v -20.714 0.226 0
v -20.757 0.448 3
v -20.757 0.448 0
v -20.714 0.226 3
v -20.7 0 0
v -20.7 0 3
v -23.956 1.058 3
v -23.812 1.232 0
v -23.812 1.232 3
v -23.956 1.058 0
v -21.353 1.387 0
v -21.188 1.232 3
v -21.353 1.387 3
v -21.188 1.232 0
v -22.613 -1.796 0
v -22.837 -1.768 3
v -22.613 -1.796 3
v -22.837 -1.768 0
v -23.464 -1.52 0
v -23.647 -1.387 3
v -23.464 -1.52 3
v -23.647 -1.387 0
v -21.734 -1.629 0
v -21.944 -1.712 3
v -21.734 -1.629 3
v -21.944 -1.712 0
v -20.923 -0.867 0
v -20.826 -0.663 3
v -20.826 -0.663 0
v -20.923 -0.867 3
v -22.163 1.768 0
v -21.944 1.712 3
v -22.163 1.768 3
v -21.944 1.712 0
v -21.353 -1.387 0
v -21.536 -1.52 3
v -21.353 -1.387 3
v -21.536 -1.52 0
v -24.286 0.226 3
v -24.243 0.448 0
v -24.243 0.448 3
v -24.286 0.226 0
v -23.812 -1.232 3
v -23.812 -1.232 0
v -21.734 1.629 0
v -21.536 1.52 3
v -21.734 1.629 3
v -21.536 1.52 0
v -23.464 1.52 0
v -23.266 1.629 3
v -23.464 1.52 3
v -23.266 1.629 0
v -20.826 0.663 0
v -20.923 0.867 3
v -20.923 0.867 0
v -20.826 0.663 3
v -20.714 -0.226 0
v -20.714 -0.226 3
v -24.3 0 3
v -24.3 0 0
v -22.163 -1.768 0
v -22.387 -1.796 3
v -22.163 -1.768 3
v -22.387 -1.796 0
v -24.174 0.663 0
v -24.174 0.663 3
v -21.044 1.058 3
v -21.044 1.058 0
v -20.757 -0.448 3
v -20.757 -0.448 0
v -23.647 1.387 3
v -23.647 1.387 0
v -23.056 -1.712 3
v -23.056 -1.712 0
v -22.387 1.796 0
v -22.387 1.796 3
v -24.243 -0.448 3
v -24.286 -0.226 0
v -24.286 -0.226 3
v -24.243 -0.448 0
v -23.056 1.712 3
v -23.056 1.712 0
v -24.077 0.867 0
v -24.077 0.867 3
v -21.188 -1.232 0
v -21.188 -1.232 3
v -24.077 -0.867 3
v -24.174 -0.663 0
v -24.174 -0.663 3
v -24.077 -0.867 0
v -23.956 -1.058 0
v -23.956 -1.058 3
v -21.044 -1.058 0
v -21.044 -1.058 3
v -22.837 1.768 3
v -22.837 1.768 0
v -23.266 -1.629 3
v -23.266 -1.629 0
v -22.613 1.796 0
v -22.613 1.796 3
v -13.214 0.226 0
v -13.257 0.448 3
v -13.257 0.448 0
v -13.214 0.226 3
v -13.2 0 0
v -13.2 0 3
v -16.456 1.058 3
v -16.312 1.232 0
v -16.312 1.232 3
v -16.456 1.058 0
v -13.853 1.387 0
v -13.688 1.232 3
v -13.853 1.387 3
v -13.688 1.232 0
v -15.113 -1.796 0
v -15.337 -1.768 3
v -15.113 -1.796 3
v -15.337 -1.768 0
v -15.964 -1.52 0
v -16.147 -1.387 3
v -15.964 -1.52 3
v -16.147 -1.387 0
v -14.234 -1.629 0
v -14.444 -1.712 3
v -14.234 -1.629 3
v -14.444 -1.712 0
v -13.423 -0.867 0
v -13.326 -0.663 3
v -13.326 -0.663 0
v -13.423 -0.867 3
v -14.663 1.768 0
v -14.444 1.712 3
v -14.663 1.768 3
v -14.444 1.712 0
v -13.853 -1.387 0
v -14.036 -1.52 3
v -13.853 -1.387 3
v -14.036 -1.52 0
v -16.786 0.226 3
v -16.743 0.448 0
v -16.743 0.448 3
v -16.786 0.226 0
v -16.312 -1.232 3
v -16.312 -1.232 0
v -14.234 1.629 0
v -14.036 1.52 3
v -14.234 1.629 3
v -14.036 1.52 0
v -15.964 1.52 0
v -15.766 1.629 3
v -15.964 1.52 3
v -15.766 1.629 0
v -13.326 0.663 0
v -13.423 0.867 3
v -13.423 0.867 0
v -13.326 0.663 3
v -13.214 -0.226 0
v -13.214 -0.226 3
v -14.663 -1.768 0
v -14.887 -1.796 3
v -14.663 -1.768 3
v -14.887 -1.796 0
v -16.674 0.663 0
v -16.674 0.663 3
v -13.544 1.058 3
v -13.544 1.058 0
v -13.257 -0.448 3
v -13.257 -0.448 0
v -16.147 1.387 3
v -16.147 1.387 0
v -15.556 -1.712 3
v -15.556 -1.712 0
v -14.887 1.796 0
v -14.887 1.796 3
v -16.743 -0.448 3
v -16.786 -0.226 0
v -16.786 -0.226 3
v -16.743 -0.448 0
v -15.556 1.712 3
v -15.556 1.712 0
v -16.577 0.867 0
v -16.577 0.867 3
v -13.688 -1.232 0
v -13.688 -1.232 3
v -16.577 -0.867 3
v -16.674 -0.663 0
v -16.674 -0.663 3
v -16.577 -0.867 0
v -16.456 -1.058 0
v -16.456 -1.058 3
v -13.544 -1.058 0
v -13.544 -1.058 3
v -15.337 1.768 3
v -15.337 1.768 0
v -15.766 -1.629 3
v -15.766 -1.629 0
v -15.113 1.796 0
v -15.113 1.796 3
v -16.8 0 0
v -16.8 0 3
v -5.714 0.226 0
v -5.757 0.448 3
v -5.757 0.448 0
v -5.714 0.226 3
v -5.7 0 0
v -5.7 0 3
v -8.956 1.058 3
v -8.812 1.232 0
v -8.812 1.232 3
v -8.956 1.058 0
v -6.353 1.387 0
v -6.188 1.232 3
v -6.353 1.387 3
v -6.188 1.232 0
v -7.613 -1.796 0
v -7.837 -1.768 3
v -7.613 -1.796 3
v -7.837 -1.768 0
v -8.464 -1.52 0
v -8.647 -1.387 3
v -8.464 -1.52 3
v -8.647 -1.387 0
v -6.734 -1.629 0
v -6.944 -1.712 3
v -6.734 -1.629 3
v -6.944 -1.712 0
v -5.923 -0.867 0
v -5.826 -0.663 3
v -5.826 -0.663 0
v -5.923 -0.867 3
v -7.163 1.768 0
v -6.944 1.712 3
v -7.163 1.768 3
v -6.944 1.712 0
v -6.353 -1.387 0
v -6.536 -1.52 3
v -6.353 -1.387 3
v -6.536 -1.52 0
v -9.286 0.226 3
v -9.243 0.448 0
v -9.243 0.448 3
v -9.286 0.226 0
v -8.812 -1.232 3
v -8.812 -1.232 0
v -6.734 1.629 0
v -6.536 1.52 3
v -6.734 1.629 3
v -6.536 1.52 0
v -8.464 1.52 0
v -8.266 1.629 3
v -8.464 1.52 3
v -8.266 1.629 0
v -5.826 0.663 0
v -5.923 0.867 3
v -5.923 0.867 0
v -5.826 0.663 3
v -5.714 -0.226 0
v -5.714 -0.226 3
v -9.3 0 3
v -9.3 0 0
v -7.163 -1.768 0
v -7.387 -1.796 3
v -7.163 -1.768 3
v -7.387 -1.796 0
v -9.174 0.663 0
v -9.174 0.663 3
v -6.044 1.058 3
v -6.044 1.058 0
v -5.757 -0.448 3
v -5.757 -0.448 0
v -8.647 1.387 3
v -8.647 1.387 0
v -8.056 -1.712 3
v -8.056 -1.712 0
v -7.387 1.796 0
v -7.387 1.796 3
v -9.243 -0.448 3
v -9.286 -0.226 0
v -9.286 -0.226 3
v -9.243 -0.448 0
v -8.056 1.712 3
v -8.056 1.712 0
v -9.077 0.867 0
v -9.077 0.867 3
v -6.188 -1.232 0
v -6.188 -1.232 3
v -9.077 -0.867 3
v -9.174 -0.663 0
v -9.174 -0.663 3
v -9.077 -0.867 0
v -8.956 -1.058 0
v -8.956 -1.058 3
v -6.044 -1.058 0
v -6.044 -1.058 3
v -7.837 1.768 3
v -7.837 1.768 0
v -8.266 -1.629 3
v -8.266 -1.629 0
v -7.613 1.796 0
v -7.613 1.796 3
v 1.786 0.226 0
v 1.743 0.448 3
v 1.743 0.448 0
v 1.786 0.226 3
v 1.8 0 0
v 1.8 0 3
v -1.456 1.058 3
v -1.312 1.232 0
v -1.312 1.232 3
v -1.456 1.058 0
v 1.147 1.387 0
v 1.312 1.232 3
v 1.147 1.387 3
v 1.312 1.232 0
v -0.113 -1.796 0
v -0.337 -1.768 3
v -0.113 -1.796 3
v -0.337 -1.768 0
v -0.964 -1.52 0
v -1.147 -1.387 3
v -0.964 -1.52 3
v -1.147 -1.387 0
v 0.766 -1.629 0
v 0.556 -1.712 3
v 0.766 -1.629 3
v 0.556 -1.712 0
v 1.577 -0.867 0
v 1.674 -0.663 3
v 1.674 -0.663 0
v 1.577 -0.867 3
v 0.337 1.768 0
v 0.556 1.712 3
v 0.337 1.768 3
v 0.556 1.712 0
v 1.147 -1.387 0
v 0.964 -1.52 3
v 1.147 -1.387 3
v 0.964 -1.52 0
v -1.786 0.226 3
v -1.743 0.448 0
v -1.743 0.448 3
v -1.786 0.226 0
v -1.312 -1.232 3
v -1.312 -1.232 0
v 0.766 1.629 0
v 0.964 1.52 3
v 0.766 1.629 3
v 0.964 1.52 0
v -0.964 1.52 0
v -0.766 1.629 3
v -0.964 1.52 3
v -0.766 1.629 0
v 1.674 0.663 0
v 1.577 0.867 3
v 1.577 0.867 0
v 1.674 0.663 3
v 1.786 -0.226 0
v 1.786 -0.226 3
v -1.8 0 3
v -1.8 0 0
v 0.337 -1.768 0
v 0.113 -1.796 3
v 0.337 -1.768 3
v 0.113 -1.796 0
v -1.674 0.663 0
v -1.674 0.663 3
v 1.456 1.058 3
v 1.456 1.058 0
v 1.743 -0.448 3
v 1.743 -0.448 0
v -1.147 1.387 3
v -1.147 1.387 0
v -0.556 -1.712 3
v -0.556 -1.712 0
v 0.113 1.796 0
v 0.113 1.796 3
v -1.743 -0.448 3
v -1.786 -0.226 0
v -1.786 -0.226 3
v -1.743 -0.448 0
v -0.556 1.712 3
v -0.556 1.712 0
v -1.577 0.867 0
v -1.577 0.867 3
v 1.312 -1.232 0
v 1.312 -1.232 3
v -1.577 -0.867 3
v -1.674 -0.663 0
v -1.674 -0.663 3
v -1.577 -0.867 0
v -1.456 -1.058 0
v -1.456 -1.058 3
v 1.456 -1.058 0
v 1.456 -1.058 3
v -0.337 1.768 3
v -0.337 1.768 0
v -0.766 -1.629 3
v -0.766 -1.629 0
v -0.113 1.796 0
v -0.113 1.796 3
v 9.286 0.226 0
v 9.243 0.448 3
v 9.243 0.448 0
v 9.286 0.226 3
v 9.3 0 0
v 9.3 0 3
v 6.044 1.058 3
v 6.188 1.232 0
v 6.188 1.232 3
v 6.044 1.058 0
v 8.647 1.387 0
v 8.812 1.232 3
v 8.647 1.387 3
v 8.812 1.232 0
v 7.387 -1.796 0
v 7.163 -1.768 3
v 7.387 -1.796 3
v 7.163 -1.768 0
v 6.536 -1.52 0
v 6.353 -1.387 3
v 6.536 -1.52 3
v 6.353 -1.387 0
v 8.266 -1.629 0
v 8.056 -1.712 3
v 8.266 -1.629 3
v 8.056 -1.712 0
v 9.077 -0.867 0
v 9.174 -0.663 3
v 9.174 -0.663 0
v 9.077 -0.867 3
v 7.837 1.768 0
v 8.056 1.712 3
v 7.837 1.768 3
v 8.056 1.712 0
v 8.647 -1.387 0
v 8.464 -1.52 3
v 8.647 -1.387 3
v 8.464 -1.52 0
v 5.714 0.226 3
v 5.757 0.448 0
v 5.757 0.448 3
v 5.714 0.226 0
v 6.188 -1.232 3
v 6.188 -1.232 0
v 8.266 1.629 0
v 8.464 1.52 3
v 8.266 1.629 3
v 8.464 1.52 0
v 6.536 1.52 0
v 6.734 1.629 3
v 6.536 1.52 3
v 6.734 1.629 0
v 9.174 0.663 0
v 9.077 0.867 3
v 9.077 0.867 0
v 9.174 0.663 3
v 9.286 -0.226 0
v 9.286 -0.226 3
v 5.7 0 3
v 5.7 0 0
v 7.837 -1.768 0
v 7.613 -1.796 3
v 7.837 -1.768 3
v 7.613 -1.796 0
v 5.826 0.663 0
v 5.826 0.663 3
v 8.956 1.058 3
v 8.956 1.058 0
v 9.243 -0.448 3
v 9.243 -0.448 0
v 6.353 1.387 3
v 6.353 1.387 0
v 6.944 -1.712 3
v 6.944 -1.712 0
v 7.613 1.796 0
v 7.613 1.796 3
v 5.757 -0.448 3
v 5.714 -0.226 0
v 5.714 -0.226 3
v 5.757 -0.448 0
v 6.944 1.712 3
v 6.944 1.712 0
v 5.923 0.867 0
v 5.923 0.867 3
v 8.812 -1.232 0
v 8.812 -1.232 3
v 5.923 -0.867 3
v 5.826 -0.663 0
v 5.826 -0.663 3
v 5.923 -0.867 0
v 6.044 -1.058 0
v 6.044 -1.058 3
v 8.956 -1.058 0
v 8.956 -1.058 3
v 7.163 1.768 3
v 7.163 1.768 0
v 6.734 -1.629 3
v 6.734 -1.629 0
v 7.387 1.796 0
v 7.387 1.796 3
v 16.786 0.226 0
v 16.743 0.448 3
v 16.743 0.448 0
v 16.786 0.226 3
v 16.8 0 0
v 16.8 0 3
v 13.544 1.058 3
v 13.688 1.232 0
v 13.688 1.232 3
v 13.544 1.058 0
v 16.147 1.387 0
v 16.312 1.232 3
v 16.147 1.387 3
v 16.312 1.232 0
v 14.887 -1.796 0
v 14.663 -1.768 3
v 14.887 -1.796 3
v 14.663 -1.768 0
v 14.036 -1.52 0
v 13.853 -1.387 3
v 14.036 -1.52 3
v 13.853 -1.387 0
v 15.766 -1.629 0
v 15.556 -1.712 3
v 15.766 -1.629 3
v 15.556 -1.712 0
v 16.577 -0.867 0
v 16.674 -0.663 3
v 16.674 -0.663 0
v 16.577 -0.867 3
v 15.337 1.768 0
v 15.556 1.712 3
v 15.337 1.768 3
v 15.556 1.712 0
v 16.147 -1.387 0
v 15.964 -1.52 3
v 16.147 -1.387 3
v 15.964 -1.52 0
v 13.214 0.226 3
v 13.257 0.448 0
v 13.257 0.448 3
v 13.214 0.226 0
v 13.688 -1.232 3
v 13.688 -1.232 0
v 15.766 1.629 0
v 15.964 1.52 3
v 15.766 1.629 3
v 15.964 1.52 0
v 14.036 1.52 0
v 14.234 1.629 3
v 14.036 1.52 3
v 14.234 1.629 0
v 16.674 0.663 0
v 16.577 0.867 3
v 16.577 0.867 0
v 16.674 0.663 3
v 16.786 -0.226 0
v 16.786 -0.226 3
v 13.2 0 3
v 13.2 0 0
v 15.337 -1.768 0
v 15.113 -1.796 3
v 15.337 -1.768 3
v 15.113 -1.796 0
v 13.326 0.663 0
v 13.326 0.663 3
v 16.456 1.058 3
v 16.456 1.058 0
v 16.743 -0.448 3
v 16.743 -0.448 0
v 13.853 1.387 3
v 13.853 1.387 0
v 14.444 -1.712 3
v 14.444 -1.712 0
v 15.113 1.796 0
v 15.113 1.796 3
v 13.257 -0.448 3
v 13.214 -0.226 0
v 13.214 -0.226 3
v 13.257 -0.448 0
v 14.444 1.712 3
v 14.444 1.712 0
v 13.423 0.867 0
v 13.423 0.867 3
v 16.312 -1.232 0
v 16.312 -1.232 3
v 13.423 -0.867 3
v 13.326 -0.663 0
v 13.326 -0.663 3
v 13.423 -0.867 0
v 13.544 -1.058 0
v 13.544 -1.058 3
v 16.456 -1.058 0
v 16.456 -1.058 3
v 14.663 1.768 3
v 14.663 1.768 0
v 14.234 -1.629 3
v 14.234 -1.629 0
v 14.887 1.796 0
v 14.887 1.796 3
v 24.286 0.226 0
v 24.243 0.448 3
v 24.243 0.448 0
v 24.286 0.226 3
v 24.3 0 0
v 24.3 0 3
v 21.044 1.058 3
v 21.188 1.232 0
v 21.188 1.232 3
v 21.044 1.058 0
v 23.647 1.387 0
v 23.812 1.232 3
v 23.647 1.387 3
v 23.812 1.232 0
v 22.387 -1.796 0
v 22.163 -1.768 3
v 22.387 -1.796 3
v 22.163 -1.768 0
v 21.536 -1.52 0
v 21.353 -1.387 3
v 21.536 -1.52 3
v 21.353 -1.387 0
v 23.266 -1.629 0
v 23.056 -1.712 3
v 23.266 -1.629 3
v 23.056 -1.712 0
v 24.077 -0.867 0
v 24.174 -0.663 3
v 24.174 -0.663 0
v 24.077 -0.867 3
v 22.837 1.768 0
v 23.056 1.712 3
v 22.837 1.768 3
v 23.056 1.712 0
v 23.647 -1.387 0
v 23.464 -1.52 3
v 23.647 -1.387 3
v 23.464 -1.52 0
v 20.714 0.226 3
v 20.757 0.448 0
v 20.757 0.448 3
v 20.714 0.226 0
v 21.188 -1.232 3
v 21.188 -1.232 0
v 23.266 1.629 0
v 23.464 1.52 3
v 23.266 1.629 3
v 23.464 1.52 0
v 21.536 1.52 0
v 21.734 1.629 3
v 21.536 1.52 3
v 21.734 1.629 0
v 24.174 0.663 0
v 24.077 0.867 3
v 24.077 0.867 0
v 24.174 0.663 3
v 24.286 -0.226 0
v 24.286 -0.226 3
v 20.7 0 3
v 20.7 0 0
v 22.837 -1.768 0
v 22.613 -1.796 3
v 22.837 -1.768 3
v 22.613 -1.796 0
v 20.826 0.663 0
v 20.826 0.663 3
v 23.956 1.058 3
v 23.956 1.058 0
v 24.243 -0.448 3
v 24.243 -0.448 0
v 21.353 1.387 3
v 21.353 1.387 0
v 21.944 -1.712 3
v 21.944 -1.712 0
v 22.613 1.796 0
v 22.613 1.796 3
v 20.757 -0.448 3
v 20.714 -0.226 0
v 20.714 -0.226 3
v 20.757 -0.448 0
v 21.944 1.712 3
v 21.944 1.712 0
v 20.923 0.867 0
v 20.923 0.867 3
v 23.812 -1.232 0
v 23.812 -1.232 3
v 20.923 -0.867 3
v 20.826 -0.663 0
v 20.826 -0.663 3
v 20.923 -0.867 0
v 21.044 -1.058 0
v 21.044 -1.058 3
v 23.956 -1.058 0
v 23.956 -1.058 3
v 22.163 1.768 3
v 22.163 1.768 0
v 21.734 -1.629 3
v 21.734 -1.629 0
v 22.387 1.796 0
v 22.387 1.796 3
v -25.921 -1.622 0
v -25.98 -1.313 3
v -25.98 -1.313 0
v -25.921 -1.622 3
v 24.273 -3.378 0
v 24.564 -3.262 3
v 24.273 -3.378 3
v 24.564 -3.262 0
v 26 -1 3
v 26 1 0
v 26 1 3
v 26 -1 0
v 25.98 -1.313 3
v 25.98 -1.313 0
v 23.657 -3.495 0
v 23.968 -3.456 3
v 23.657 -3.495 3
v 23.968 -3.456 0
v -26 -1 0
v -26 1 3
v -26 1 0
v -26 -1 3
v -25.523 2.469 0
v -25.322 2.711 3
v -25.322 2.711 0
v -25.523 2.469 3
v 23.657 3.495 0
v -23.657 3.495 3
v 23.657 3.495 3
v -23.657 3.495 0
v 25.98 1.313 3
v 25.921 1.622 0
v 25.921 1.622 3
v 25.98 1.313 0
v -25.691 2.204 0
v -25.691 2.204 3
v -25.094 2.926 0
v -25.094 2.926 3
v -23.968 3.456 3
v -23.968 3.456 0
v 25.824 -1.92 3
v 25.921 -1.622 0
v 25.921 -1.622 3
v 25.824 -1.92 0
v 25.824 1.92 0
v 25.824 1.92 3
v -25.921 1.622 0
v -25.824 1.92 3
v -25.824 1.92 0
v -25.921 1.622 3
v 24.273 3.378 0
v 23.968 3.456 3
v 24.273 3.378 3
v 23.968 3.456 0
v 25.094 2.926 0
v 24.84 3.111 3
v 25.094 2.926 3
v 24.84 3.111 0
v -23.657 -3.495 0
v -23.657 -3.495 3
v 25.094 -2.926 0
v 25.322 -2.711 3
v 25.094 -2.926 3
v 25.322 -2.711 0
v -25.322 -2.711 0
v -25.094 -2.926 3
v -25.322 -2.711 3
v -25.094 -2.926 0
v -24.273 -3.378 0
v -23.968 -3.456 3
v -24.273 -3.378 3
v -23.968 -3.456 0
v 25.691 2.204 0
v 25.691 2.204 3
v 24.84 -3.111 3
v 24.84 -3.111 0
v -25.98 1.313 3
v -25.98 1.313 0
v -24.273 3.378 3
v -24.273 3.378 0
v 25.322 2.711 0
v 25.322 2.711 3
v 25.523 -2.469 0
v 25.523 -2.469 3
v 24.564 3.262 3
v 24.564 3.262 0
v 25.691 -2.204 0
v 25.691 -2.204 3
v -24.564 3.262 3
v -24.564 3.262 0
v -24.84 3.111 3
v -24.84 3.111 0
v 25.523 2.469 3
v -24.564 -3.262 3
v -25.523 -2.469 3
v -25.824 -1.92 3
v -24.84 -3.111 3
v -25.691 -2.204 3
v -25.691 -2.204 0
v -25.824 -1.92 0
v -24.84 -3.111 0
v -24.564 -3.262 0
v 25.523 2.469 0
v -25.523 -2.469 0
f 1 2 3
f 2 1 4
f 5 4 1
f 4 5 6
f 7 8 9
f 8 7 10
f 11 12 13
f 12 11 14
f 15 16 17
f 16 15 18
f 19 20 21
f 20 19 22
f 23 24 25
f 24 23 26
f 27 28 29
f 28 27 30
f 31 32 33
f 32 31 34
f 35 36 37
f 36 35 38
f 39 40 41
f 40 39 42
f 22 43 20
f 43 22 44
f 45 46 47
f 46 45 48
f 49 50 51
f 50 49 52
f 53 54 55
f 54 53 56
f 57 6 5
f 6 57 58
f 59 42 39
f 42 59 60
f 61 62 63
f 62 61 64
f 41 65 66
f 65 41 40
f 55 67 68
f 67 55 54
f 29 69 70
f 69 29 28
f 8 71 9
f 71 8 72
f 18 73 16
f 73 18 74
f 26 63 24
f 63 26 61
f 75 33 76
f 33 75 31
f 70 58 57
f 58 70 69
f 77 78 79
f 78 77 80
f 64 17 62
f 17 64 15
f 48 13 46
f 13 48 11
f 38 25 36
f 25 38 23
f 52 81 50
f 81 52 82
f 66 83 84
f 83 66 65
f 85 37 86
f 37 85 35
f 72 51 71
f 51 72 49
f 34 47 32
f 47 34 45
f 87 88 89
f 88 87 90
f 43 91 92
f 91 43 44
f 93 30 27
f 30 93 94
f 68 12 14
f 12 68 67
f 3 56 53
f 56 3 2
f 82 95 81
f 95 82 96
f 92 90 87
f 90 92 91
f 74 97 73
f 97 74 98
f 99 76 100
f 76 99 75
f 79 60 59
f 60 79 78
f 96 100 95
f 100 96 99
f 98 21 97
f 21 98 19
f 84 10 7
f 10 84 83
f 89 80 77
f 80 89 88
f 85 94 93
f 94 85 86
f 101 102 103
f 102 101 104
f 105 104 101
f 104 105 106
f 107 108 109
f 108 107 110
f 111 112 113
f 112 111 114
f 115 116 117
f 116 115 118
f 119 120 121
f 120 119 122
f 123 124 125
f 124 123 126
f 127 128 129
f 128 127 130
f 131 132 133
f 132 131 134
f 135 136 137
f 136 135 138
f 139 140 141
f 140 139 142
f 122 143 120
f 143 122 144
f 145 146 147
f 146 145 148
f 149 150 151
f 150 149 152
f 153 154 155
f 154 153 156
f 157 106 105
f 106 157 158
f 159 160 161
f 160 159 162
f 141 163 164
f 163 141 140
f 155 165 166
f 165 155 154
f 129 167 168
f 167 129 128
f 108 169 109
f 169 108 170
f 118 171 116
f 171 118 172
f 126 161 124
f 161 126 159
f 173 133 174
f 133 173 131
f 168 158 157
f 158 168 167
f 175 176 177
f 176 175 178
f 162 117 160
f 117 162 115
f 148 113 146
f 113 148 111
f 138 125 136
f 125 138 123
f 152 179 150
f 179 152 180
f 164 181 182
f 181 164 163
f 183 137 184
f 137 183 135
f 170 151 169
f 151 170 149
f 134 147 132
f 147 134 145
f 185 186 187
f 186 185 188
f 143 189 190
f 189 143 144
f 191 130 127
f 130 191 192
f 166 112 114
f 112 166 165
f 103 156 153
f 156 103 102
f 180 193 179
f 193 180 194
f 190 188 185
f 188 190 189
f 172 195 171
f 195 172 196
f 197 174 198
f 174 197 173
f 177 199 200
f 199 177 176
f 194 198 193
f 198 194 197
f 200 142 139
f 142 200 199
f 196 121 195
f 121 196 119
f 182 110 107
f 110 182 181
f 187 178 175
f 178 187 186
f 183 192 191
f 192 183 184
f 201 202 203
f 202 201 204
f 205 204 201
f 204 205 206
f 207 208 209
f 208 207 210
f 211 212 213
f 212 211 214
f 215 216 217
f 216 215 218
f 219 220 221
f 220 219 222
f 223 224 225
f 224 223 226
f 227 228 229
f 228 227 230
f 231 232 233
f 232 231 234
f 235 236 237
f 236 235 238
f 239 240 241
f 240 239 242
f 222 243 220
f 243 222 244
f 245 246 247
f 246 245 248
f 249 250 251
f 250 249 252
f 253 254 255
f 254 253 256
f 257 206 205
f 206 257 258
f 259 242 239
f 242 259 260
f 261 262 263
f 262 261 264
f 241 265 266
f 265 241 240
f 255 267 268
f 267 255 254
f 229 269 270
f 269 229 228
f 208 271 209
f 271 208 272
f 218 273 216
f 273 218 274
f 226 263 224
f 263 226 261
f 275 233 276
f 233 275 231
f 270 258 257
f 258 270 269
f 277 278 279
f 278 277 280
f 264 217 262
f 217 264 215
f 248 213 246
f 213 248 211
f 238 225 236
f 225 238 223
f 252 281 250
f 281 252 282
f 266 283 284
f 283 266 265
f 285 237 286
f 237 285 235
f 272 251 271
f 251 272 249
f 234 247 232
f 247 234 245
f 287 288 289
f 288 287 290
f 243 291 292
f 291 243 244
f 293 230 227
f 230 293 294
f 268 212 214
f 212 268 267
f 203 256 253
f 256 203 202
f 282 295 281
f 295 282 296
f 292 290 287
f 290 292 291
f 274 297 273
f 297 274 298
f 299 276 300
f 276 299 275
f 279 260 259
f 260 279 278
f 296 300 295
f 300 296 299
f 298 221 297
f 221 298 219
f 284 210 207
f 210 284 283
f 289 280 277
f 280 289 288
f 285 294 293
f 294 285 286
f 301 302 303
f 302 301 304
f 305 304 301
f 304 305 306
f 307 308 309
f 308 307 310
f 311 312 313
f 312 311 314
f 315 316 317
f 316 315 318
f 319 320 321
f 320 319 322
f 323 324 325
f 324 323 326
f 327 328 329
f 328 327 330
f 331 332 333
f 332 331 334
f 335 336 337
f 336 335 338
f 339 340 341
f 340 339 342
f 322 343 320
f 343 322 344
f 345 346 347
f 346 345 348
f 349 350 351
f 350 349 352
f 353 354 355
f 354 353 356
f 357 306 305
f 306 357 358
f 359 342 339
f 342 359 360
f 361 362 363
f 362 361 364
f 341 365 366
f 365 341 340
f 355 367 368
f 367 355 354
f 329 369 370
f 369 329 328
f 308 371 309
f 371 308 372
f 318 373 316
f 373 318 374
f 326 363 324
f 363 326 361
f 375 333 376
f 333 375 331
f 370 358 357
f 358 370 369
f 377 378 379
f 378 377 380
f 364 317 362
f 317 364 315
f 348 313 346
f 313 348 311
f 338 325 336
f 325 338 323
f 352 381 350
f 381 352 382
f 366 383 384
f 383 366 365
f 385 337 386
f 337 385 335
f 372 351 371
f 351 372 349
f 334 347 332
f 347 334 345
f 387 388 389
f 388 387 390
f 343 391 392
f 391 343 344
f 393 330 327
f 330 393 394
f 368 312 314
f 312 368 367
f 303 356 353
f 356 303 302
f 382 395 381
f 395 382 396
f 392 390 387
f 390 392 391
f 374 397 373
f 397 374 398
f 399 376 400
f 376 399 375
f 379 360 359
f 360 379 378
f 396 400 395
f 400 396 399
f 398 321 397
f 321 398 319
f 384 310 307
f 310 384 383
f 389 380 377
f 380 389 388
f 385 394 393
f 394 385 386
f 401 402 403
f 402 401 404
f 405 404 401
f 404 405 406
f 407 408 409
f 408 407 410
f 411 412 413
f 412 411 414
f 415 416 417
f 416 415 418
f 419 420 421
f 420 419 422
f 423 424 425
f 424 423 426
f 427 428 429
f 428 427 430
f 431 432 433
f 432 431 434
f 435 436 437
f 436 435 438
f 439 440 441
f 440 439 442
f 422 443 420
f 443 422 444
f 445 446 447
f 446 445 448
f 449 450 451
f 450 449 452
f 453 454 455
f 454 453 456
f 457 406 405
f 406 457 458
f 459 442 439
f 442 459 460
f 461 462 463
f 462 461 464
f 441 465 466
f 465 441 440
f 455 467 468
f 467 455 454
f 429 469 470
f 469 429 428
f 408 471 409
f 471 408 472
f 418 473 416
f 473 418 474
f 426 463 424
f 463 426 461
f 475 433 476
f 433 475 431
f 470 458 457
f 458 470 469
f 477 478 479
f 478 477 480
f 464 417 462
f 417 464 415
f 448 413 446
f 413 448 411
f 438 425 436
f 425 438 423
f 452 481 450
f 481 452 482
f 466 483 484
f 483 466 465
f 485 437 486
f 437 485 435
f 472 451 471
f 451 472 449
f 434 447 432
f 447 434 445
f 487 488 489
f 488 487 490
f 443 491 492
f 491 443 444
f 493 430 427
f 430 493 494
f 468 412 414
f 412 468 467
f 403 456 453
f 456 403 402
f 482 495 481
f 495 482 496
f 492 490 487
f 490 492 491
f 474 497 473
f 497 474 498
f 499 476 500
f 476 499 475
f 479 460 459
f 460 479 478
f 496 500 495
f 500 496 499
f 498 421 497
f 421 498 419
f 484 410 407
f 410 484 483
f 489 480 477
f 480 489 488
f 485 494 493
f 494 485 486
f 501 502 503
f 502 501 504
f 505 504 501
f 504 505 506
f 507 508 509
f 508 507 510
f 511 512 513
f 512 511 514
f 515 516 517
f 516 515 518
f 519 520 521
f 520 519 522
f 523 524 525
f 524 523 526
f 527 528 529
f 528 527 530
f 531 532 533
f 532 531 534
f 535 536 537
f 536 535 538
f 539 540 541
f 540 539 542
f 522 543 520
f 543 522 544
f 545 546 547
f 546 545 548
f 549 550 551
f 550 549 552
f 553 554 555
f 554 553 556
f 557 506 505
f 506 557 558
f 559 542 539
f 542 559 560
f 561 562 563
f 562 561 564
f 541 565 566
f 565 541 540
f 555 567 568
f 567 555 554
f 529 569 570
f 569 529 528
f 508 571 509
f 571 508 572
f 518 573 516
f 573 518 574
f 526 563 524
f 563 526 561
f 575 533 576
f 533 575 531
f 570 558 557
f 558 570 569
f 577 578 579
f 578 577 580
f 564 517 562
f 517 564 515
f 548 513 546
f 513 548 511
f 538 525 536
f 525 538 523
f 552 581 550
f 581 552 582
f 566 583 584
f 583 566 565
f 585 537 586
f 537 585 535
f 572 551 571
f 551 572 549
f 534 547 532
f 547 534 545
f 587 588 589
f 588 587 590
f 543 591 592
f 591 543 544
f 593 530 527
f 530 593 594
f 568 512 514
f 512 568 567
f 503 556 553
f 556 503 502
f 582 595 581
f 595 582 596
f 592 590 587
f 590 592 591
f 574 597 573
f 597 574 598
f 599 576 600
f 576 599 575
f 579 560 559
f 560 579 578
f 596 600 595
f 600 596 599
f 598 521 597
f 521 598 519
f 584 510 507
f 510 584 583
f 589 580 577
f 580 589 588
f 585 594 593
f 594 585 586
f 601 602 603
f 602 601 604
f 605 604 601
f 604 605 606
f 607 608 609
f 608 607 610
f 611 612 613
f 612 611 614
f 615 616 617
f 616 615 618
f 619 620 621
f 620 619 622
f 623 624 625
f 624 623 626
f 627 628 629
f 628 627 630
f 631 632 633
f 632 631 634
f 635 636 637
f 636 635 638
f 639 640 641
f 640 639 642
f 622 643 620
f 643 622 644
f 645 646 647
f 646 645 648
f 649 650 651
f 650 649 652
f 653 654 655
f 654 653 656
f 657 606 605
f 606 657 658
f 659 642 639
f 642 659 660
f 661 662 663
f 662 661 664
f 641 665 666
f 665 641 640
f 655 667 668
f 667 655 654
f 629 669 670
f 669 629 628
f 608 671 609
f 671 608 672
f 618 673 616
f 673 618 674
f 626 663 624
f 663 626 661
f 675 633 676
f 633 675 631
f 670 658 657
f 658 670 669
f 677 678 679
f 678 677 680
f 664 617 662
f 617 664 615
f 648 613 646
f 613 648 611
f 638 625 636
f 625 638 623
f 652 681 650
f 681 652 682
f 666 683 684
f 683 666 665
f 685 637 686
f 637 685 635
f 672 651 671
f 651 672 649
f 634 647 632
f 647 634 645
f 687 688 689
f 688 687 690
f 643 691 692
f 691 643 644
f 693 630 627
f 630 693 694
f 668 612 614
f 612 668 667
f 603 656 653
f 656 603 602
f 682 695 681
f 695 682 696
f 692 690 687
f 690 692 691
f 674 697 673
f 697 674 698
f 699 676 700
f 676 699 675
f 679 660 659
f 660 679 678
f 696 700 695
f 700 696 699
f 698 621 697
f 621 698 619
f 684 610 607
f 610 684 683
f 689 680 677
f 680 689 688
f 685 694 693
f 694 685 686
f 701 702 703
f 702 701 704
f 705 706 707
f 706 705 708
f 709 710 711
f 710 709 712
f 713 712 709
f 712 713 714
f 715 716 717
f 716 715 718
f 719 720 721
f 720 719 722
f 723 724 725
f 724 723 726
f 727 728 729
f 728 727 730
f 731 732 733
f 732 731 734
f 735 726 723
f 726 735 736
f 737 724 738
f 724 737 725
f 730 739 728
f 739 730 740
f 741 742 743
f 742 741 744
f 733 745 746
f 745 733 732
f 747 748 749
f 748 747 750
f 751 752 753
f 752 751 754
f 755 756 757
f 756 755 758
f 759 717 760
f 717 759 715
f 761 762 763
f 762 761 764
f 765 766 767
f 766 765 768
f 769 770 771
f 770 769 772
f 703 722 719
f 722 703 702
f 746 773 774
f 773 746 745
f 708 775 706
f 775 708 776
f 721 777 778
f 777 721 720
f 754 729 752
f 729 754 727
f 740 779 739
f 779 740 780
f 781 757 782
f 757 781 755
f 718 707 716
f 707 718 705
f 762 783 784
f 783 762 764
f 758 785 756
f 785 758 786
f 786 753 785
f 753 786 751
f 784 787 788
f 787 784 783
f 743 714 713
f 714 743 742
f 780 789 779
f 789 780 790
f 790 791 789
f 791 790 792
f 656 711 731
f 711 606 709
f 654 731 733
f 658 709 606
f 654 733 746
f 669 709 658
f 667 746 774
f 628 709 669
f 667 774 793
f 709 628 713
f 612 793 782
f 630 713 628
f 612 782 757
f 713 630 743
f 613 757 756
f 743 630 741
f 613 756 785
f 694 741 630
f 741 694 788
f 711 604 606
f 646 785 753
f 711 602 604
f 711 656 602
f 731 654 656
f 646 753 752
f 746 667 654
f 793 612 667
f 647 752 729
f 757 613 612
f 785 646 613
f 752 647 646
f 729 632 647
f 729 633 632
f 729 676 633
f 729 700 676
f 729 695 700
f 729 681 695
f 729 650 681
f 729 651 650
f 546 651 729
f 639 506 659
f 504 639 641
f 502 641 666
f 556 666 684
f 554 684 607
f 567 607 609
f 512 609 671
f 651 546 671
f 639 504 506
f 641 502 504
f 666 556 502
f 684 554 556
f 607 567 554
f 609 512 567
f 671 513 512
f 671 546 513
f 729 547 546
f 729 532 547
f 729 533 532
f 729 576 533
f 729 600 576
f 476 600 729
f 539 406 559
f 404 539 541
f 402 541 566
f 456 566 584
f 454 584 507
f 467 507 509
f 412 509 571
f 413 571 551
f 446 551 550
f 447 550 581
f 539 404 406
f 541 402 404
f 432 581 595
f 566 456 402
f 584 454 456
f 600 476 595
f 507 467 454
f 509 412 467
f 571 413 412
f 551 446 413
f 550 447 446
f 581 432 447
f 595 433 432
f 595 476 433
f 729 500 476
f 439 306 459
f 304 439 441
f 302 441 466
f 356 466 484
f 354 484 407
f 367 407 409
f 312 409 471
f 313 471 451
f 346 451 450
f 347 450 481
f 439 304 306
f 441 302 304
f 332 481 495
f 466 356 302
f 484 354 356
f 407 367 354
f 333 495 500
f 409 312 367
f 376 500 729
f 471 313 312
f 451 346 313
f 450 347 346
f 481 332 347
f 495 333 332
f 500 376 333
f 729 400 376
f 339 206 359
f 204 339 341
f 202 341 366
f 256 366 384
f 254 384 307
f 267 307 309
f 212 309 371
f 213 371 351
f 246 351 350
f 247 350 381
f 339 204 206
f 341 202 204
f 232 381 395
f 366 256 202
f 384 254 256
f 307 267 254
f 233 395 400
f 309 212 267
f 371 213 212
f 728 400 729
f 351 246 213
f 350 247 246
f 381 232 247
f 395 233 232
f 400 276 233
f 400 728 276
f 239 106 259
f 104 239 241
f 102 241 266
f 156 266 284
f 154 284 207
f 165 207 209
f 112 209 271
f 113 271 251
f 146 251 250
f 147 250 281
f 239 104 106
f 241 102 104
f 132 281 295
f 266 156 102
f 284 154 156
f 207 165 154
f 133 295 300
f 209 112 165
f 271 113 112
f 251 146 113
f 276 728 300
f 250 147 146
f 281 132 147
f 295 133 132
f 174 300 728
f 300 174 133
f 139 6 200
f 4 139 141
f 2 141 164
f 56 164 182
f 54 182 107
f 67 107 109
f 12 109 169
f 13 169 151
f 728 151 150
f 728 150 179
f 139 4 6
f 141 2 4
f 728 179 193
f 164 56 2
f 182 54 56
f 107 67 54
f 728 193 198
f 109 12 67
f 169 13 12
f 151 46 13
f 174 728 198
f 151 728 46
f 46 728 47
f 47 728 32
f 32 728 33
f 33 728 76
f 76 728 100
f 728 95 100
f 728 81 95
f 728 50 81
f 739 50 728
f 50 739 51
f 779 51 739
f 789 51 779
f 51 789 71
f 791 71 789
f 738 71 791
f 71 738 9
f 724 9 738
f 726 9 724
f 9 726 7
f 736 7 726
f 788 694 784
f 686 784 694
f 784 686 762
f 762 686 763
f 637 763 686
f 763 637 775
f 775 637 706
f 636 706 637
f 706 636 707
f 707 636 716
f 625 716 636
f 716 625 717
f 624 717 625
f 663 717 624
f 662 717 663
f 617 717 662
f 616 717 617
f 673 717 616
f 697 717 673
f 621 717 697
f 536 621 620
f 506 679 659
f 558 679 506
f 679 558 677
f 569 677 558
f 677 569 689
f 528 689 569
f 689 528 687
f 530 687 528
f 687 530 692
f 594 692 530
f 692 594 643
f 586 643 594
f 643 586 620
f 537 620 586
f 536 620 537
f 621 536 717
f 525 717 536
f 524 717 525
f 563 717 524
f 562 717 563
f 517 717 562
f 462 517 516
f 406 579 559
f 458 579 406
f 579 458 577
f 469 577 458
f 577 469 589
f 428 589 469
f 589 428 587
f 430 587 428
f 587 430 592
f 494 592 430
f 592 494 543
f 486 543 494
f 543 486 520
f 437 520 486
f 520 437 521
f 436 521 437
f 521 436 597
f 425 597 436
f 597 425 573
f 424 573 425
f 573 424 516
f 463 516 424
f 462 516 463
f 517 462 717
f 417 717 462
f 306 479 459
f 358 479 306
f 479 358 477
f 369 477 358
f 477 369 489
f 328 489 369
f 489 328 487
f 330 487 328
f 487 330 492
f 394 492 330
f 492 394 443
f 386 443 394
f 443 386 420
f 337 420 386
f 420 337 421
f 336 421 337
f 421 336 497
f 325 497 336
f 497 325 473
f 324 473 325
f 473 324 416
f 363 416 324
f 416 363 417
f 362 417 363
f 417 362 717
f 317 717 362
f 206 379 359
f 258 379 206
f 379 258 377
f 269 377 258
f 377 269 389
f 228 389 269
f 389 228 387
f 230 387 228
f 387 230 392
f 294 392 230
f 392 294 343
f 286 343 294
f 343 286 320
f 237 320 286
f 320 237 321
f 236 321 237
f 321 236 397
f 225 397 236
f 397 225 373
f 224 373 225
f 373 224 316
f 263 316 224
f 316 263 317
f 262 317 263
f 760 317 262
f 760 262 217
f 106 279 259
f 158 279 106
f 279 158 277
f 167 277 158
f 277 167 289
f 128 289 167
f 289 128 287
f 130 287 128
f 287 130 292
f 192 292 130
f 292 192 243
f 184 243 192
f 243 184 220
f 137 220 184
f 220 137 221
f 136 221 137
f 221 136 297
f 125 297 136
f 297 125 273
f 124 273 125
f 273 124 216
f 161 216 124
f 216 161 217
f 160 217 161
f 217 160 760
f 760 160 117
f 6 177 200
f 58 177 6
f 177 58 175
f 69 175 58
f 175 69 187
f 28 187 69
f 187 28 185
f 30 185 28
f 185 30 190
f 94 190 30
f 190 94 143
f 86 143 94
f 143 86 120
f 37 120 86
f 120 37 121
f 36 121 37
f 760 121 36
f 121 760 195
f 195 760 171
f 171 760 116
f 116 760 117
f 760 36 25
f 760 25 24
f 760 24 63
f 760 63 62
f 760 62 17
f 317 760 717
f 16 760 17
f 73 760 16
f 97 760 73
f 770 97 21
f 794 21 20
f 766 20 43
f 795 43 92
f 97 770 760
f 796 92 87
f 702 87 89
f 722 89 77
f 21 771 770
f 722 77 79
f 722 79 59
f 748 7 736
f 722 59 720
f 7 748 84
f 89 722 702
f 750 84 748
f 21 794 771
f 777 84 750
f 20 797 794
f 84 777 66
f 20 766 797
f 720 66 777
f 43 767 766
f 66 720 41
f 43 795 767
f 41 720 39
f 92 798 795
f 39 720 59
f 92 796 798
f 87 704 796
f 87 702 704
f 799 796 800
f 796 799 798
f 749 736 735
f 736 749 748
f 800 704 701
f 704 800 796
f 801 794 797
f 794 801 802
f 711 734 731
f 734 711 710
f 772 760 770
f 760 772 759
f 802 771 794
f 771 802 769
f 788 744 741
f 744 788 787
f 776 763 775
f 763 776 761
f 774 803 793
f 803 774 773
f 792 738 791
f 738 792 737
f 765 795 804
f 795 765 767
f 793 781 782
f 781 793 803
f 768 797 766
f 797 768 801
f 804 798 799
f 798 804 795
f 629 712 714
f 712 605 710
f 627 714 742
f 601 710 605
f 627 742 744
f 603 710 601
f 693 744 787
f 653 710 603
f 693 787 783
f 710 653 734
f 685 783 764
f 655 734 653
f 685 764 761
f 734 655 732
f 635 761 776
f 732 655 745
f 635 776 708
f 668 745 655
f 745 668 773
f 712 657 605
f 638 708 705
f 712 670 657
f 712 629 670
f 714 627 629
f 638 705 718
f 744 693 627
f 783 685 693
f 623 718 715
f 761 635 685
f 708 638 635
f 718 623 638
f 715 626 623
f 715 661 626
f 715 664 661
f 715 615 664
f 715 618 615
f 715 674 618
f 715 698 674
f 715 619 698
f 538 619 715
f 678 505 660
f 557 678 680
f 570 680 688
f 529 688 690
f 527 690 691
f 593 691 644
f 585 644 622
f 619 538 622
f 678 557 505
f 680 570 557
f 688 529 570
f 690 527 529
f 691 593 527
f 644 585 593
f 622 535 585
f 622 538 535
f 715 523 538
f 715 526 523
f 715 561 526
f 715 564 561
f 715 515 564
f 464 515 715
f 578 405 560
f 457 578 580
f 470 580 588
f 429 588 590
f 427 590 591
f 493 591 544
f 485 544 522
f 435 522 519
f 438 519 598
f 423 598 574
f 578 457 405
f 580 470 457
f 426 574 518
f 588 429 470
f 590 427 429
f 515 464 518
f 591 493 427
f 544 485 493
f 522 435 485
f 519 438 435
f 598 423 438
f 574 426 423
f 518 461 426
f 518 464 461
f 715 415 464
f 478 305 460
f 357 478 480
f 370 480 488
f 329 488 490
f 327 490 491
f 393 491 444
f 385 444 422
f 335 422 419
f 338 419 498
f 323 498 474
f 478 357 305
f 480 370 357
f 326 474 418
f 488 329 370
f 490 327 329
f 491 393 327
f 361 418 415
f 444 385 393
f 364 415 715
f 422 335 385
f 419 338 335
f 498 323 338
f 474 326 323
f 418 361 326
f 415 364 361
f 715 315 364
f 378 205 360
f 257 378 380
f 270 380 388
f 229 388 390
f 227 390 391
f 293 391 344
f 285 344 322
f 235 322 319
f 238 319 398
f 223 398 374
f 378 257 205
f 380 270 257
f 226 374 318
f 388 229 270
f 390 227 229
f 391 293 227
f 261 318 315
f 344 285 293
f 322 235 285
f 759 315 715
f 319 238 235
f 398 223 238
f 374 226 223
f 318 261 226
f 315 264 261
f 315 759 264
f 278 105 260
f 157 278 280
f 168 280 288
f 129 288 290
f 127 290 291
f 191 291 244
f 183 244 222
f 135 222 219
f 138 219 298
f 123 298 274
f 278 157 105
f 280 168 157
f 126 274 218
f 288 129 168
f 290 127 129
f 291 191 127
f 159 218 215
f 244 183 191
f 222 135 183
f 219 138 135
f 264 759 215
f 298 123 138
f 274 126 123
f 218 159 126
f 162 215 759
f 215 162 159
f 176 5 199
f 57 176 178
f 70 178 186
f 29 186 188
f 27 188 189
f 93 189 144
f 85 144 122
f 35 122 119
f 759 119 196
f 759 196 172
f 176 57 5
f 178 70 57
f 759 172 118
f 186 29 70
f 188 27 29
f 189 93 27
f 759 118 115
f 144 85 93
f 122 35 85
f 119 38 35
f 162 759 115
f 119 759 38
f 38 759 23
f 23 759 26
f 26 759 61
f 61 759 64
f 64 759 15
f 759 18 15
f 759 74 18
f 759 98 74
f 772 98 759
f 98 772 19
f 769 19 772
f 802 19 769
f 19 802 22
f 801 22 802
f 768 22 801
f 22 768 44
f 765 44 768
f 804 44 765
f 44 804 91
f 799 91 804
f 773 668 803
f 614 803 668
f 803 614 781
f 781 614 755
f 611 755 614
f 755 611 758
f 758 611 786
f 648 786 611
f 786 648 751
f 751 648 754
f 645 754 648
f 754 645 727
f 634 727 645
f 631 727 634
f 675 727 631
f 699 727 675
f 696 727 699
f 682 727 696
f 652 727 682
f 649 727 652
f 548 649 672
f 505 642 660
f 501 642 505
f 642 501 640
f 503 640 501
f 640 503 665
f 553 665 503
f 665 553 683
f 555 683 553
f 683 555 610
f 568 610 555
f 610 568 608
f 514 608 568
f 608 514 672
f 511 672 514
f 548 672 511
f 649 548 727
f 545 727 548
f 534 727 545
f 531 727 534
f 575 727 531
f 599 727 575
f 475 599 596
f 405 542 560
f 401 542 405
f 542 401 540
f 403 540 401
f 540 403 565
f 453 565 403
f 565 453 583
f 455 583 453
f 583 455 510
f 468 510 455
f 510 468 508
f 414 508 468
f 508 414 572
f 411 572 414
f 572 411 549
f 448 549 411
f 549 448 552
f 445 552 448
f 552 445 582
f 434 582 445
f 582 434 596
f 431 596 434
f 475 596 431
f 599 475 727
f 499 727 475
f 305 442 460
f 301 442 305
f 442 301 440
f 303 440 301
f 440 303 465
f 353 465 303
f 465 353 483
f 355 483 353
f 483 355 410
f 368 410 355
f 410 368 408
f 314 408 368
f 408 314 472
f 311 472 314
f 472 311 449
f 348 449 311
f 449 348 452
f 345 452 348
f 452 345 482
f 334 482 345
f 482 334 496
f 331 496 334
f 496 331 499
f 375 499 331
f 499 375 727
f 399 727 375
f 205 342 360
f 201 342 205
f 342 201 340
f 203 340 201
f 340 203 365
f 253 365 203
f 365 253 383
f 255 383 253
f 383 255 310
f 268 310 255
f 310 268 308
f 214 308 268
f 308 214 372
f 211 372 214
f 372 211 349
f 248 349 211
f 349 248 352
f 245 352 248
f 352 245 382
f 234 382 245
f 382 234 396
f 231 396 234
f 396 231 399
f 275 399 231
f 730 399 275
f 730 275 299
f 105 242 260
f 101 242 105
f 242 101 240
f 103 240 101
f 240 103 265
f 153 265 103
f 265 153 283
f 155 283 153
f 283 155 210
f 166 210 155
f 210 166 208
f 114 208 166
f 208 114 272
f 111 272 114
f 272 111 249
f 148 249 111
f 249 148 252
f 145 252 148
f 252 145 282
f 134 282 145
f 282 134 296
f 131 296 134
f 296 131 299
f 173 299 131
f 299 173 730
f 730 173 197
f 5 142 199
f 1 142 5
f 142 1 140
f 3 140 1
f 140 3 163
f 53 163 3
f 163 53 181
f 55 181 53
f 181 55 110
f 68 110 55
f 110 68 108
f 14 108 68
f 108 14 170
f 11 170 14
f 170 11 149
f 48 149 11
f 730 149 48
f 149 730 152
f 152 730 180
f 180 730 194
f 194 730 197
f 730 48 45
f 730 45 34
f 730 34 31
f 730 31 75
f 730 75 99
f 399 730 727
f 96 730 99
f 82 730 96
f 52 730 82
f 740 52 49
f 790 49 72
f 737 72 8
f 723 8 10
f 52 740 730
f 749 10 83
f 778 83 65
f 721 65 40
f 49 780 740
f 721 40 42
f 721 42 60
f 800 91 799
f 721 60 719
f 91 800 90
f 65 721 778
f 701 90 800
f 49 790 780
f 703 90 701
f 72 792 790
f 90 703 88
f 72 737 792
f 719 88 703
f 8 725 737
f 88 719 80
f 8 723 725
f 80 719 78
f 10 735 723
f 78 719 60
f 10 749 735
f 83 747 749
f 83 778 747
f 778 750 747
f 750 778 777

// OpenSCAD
$fn = 50;


difference() {
	union() {
		translate(v = [0, 0, 0]) {
			rotate(a = [0, 0, 0]) {
				hull() {
					translate(v = [-23.5000000000, 1.0000000000, 0]) {
						rotate(a = [0, 0, 0]) {
							translate(v = [0, 0, 0]) {
								rotate(a = [0, 0, 0]) {
									cylinder(h = 3, r = 2.5000000000);
								}
							}
						}
					}
					translate(v = [23.5000000000, 1.0000000000, 0]) {
						rotate(a = [0, 0, 0]) {
							translate(v = [0, 0, 0]) {
								rotate(a = [0, 0, 0]) {
									cylinder(h = 3, r = 2.5000000000);
								}
							}
						}
					}
					translate(v = [-23.5000000000, -1.0000000000, 0]) {
						rotate(a = [0, 0, 0]) {
							translate(v = [0, 0, 0]) {
								rotate(a = [0, 0, 0]) {
									cylinder(h = 3, r = 2.5000000000);
								}
							}
						}
					}
					translate(v = [23.5000000000, -1.0000000000, 0]) {
						rotate(a = [0, 0, 0]) {
							translate(v = [0, 0, 0]) {
								rotate(a = [0, 0, 0]) {
									cylinder(h = 3, r = 2.5000000000);
								}
							}
						}
					}
				}
			}
		}
	}
	union() {
		translate(v = [-22.5000000000, 0.0000000000, 0]) {
			rotate(a = [0, 0, 0]) {
				translate(v = [0, 0, -50]) {
					rotate(a = [0, 0, 0]) {
						cylinder(h = 100, r = 1.8000000000);
					}
				}
			}
		}
		translate(v = [-15.0000000000, 0.0000000000, 0]) {
			rotate(a = [0, 0, 0]) {
				translate(v = [0, 0, -50]) {
					rotate(a = [0, 0, 0]) {
						cylinder(h = 100, r = 1.8000000000);
					}
				}
			}
		}
		translate(v = [-7.5000000000, 0.0000000000, 0]) {
			rotate(a = [0, 0, 0]) {
				translate(v = [0, 0, -50]) {
					rotate(a = [0, 0, 0]) {
						cylinder(h = 100, r = 1.8000000000);
					}
				}
			}
		}
		translate(v = [0.0000000000, 0.0000000000, 0]) {
			rotate(a = [0, 0, 0]) {
				translate(v = [0, 0, -50]) {
					rotate(a = [0, 0, 0]) {
						cylinder(h = 100, r = 1.8000000000);
					}
				}
			}
		}
		translate(v = [7.5000000000, 0.0000000000, 0]) {
			rotate(a = [0, 0, 0]) {
				translate(v = [0, 0, -50]) {
					rotate(a = [0, 0, 0]) {
						cylinder(h = 100, r = 1.8000000000);
					}
				}
			}
		}
		translate(v = [15.0000000000, 0.0000000000, 0]) {
			rotate(a = [0, 0, 0]) {
				translate(v = [0, 0, -50]) {
					rotate(a = [0, 0, 0]) {
						cylinder(h = 100, r = 1.8000000000);
					}
				}
			}
		}
		translate(v = [22.5000000000, 0.0000000000, 0]) {
			rotate(a = [0, 0, 0]) {
				translate(v = [0, 0, -50]) {
					rotate(a = [0, 0, 0]) {
						cylinder(h = 100, r = 1.8000000000);
					}
				}
			}
		}
	}
}
